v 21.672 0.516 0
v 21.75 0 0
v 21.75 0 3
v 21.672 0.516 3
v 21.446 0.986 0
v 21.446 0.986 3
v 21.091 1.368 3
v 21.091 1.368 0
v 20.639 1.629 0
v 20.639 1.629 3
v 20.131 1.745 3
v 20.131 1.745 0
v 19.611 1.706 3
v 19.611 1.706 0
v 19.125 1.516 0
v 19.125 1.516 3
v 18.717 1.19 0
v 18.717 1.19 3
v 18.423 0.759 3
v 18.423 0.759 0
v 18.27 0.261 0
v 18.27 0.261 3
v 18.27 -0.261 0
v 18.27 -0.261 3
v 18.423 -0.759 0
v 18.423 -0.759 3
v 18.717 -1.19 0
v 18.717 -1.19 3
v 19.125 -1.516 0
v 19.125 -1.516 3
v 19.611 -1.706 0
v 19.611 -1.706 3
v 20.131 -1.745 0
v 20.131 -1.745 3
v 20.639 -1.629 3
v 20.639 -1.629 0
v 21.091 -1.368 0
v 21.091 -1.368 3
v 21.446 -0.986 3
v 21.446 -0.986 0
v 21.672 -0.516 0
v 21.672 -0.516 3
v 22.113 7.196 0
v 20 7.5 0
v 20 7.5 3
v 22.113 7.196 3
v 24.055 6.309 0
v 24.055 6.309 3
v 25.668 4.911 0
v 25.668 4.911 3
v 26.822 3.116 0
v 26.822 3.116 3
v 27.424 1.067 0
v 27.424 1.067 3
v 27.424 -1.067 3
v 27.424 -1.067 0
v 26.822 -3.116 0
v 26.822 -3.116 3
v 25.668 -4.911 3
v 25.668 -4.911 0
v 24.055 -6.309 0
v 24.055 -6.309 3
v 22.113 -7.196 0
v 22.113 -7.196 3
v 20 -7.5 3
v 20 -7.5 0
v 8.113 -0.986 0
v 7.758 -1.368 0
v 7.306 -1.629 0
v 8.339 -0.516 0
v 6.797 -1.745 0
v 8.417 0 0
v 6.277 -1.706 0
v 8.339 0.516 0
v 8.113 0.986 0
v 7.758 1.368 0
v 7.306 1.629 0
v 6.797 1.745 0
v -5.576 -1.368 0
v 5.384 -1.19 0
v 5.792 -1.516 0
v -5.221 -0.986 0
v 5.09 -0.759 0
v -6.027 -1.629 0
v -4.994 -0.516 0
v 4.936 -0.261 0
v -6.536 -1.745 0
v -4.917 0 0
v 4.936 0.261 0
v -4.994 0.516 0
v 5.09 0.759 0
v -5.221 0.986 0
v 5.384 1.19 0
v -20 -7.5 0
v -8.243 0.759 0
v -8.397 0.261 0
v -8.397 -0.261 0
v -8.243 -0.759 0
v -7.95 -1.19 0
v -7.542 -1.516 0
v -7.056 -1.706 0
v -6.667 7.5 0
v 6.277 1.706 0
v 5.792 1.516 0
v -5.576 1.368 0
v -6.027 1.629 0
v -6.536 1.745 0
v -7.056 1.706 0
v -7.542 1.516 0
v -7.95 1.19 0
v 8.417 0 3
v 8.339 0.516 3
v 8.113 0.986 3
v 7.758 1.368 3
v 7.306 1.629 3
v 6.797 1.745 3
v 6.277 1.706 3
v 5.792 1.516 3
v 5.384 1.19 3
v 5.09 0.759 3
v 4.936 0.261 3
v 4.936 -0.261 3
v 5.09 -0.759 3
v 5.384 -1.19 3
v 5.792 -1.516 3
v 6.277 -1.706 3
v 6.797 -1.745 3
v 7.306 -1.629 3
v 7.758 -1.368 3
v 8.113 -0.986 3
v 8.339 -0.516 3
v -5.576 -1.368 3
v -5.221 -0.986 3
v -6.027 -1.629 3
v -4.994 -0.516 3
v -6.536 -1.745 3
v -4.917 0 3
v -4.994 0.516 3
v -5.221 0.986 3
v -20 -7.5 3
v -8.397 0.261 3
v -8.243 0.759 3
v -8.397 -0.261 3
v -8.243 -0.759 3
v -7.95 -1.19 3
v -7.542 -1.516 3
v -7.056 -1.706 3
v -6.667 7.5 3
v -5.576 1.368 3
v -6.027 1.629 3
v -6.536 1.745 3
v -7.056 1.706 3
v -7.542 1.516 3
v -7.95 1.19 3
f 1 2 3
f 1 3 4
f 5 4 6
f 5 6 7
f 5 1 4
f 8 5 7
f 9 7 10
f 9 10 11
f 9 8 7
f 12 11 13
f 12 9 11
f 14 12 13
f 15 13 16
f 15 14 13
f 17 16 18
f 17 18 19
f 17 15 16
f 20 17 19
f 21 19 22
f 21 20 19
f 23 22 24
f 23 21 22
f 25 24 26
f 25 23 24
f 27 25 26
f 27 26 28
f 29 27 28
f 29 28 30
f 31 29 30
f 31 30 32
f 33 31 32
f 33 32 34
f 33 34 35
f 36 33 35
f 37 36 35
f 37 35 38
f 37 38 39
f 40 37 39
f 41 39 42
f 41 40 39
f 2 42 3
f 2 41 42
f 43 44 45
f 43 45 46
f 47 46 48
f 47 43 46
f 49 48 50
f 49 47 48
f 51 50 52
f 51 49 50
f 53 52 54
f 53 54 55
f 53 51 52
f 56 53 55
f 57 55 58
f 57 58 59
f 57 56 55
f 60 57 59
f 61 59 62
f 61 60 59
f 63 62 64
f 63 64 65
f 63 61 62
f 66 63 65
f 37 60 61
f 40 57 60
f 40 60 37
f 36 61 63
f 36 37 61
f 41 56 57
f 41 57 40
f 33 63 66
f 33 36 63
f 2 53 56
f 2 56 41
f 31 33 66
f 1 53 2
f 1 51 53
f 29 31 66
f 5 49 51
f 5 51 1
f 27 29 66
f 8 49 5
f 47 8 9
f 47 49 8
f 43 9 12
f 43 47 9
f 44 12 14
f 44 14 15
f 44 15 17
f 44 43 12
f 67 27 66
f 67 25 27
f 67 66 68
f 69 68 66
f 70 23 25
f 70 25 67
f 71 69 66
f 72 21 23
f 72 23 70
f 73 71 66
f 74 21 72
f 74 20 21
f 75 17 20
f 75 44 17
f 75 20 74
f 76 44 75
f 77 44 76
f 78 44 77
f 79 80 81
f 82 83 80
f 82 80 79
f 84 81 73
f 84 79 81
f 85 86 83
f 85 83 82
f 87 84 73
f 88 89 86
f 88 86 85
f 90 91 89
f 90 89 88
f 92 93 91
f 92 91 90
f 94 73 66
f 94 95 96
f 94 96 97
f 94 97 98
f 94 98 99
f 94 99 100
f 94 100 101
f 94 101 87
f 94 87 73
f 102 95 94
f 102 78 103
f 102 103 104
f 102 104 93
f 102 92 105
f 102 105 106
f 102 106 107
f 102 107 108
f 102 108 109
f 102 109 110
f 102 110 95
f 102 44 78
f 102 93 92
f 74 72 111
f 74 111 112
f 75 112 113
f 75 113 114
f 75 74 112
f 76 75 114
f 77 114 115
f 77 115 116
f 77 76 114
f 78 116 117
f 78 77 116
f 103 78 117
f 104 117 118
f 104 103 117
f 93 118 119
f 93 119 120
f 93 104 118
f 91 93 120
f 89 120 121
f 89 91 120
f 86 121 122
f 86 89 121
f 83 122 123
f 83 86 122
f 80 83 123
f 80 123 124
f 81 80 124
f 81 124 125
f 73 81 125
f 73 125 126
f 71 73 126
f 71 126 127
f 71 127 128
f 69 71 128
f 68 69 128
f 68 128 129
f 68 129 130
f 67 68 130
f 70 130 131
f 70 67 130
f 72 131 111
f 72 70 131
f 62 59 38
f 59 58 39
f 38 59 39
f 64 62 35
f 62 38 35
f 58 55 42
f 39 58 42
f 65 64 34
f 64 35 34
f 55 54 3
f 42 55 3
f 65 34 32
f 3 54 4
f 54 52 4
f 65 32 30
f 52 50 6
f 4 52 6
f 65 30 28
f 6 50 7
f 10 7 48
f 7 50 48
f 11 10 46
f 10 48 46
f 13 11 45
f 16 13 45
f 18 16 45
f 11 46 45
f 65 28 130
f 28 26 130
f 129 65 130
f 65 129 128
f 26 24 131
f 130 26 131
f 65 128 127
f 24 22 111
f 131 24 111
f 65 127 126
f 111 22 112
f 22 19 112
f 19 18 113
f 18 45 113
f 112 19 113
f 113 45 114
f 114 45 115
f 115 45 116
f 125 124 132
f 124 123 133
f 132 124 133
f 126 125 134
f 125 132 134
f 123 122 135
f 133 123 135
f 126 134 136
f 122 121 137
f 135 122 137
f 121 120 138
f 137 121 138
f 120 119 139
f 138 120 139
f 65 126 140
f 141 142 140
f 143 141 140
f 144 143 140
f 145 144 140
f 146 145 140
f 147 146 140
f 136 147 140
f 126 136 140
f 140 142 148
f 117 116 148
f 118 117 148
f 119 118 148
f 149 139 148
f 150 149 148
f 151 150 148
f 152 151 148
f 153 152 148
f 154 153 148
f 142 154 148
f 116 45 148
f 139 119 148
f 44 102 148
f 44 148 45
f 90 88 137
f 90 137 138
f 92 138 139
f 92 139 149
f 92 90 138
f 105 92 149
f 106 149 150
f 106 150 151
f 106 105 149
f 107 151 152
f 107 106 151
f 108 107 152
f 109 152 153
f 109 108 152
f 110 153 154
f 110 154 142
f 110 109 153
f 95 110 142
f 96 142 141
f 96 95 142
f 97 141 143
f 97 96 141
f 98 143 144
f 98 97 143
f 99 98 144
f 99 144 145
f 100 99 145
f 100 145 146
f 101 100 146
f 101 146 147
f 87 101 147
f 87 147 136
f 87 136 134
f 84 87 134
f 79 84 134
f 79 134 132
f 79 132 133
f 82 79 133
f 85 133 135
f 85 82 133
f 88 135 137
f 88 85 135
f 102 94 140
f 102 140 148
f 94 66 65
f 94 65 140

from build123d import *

# Parameters (mm, degrees)
SKETCH_1_R      = 1.75
EXTRUDE_1_DEPTH = 3


with BuildPart() as part:
    # 草圖1 → 伸長1 (new body)
    with BuildSketch(Plane.XY):
        with BuildLine():
            Line((-6.666666667, 7.5), (20, 7.5))
            ThreePointArc((20, 7.5), (27.5, 0), (20, -7.5))
            Line((20, -7.5), (-20, -7.5))
            Line((-20, -7.5), (-6.666666667, 7.5))
        make_face()
        with Locations((20, 0)):
            Circle(SKETCH_1_R, mode=Mode.SUBTRACT)
        with Locations((-6.666666667, 0)):
            Circle(SKETCH_1_R, mode=Mode.SUBTRACT)
        with Locations((6.666666667, 0)):
            Circle(SKETCH_1_R, mode=Mode.SUBTRACT)
    extrude(amount=EXTRUDE_1_DEPTH)


solid = part.part
